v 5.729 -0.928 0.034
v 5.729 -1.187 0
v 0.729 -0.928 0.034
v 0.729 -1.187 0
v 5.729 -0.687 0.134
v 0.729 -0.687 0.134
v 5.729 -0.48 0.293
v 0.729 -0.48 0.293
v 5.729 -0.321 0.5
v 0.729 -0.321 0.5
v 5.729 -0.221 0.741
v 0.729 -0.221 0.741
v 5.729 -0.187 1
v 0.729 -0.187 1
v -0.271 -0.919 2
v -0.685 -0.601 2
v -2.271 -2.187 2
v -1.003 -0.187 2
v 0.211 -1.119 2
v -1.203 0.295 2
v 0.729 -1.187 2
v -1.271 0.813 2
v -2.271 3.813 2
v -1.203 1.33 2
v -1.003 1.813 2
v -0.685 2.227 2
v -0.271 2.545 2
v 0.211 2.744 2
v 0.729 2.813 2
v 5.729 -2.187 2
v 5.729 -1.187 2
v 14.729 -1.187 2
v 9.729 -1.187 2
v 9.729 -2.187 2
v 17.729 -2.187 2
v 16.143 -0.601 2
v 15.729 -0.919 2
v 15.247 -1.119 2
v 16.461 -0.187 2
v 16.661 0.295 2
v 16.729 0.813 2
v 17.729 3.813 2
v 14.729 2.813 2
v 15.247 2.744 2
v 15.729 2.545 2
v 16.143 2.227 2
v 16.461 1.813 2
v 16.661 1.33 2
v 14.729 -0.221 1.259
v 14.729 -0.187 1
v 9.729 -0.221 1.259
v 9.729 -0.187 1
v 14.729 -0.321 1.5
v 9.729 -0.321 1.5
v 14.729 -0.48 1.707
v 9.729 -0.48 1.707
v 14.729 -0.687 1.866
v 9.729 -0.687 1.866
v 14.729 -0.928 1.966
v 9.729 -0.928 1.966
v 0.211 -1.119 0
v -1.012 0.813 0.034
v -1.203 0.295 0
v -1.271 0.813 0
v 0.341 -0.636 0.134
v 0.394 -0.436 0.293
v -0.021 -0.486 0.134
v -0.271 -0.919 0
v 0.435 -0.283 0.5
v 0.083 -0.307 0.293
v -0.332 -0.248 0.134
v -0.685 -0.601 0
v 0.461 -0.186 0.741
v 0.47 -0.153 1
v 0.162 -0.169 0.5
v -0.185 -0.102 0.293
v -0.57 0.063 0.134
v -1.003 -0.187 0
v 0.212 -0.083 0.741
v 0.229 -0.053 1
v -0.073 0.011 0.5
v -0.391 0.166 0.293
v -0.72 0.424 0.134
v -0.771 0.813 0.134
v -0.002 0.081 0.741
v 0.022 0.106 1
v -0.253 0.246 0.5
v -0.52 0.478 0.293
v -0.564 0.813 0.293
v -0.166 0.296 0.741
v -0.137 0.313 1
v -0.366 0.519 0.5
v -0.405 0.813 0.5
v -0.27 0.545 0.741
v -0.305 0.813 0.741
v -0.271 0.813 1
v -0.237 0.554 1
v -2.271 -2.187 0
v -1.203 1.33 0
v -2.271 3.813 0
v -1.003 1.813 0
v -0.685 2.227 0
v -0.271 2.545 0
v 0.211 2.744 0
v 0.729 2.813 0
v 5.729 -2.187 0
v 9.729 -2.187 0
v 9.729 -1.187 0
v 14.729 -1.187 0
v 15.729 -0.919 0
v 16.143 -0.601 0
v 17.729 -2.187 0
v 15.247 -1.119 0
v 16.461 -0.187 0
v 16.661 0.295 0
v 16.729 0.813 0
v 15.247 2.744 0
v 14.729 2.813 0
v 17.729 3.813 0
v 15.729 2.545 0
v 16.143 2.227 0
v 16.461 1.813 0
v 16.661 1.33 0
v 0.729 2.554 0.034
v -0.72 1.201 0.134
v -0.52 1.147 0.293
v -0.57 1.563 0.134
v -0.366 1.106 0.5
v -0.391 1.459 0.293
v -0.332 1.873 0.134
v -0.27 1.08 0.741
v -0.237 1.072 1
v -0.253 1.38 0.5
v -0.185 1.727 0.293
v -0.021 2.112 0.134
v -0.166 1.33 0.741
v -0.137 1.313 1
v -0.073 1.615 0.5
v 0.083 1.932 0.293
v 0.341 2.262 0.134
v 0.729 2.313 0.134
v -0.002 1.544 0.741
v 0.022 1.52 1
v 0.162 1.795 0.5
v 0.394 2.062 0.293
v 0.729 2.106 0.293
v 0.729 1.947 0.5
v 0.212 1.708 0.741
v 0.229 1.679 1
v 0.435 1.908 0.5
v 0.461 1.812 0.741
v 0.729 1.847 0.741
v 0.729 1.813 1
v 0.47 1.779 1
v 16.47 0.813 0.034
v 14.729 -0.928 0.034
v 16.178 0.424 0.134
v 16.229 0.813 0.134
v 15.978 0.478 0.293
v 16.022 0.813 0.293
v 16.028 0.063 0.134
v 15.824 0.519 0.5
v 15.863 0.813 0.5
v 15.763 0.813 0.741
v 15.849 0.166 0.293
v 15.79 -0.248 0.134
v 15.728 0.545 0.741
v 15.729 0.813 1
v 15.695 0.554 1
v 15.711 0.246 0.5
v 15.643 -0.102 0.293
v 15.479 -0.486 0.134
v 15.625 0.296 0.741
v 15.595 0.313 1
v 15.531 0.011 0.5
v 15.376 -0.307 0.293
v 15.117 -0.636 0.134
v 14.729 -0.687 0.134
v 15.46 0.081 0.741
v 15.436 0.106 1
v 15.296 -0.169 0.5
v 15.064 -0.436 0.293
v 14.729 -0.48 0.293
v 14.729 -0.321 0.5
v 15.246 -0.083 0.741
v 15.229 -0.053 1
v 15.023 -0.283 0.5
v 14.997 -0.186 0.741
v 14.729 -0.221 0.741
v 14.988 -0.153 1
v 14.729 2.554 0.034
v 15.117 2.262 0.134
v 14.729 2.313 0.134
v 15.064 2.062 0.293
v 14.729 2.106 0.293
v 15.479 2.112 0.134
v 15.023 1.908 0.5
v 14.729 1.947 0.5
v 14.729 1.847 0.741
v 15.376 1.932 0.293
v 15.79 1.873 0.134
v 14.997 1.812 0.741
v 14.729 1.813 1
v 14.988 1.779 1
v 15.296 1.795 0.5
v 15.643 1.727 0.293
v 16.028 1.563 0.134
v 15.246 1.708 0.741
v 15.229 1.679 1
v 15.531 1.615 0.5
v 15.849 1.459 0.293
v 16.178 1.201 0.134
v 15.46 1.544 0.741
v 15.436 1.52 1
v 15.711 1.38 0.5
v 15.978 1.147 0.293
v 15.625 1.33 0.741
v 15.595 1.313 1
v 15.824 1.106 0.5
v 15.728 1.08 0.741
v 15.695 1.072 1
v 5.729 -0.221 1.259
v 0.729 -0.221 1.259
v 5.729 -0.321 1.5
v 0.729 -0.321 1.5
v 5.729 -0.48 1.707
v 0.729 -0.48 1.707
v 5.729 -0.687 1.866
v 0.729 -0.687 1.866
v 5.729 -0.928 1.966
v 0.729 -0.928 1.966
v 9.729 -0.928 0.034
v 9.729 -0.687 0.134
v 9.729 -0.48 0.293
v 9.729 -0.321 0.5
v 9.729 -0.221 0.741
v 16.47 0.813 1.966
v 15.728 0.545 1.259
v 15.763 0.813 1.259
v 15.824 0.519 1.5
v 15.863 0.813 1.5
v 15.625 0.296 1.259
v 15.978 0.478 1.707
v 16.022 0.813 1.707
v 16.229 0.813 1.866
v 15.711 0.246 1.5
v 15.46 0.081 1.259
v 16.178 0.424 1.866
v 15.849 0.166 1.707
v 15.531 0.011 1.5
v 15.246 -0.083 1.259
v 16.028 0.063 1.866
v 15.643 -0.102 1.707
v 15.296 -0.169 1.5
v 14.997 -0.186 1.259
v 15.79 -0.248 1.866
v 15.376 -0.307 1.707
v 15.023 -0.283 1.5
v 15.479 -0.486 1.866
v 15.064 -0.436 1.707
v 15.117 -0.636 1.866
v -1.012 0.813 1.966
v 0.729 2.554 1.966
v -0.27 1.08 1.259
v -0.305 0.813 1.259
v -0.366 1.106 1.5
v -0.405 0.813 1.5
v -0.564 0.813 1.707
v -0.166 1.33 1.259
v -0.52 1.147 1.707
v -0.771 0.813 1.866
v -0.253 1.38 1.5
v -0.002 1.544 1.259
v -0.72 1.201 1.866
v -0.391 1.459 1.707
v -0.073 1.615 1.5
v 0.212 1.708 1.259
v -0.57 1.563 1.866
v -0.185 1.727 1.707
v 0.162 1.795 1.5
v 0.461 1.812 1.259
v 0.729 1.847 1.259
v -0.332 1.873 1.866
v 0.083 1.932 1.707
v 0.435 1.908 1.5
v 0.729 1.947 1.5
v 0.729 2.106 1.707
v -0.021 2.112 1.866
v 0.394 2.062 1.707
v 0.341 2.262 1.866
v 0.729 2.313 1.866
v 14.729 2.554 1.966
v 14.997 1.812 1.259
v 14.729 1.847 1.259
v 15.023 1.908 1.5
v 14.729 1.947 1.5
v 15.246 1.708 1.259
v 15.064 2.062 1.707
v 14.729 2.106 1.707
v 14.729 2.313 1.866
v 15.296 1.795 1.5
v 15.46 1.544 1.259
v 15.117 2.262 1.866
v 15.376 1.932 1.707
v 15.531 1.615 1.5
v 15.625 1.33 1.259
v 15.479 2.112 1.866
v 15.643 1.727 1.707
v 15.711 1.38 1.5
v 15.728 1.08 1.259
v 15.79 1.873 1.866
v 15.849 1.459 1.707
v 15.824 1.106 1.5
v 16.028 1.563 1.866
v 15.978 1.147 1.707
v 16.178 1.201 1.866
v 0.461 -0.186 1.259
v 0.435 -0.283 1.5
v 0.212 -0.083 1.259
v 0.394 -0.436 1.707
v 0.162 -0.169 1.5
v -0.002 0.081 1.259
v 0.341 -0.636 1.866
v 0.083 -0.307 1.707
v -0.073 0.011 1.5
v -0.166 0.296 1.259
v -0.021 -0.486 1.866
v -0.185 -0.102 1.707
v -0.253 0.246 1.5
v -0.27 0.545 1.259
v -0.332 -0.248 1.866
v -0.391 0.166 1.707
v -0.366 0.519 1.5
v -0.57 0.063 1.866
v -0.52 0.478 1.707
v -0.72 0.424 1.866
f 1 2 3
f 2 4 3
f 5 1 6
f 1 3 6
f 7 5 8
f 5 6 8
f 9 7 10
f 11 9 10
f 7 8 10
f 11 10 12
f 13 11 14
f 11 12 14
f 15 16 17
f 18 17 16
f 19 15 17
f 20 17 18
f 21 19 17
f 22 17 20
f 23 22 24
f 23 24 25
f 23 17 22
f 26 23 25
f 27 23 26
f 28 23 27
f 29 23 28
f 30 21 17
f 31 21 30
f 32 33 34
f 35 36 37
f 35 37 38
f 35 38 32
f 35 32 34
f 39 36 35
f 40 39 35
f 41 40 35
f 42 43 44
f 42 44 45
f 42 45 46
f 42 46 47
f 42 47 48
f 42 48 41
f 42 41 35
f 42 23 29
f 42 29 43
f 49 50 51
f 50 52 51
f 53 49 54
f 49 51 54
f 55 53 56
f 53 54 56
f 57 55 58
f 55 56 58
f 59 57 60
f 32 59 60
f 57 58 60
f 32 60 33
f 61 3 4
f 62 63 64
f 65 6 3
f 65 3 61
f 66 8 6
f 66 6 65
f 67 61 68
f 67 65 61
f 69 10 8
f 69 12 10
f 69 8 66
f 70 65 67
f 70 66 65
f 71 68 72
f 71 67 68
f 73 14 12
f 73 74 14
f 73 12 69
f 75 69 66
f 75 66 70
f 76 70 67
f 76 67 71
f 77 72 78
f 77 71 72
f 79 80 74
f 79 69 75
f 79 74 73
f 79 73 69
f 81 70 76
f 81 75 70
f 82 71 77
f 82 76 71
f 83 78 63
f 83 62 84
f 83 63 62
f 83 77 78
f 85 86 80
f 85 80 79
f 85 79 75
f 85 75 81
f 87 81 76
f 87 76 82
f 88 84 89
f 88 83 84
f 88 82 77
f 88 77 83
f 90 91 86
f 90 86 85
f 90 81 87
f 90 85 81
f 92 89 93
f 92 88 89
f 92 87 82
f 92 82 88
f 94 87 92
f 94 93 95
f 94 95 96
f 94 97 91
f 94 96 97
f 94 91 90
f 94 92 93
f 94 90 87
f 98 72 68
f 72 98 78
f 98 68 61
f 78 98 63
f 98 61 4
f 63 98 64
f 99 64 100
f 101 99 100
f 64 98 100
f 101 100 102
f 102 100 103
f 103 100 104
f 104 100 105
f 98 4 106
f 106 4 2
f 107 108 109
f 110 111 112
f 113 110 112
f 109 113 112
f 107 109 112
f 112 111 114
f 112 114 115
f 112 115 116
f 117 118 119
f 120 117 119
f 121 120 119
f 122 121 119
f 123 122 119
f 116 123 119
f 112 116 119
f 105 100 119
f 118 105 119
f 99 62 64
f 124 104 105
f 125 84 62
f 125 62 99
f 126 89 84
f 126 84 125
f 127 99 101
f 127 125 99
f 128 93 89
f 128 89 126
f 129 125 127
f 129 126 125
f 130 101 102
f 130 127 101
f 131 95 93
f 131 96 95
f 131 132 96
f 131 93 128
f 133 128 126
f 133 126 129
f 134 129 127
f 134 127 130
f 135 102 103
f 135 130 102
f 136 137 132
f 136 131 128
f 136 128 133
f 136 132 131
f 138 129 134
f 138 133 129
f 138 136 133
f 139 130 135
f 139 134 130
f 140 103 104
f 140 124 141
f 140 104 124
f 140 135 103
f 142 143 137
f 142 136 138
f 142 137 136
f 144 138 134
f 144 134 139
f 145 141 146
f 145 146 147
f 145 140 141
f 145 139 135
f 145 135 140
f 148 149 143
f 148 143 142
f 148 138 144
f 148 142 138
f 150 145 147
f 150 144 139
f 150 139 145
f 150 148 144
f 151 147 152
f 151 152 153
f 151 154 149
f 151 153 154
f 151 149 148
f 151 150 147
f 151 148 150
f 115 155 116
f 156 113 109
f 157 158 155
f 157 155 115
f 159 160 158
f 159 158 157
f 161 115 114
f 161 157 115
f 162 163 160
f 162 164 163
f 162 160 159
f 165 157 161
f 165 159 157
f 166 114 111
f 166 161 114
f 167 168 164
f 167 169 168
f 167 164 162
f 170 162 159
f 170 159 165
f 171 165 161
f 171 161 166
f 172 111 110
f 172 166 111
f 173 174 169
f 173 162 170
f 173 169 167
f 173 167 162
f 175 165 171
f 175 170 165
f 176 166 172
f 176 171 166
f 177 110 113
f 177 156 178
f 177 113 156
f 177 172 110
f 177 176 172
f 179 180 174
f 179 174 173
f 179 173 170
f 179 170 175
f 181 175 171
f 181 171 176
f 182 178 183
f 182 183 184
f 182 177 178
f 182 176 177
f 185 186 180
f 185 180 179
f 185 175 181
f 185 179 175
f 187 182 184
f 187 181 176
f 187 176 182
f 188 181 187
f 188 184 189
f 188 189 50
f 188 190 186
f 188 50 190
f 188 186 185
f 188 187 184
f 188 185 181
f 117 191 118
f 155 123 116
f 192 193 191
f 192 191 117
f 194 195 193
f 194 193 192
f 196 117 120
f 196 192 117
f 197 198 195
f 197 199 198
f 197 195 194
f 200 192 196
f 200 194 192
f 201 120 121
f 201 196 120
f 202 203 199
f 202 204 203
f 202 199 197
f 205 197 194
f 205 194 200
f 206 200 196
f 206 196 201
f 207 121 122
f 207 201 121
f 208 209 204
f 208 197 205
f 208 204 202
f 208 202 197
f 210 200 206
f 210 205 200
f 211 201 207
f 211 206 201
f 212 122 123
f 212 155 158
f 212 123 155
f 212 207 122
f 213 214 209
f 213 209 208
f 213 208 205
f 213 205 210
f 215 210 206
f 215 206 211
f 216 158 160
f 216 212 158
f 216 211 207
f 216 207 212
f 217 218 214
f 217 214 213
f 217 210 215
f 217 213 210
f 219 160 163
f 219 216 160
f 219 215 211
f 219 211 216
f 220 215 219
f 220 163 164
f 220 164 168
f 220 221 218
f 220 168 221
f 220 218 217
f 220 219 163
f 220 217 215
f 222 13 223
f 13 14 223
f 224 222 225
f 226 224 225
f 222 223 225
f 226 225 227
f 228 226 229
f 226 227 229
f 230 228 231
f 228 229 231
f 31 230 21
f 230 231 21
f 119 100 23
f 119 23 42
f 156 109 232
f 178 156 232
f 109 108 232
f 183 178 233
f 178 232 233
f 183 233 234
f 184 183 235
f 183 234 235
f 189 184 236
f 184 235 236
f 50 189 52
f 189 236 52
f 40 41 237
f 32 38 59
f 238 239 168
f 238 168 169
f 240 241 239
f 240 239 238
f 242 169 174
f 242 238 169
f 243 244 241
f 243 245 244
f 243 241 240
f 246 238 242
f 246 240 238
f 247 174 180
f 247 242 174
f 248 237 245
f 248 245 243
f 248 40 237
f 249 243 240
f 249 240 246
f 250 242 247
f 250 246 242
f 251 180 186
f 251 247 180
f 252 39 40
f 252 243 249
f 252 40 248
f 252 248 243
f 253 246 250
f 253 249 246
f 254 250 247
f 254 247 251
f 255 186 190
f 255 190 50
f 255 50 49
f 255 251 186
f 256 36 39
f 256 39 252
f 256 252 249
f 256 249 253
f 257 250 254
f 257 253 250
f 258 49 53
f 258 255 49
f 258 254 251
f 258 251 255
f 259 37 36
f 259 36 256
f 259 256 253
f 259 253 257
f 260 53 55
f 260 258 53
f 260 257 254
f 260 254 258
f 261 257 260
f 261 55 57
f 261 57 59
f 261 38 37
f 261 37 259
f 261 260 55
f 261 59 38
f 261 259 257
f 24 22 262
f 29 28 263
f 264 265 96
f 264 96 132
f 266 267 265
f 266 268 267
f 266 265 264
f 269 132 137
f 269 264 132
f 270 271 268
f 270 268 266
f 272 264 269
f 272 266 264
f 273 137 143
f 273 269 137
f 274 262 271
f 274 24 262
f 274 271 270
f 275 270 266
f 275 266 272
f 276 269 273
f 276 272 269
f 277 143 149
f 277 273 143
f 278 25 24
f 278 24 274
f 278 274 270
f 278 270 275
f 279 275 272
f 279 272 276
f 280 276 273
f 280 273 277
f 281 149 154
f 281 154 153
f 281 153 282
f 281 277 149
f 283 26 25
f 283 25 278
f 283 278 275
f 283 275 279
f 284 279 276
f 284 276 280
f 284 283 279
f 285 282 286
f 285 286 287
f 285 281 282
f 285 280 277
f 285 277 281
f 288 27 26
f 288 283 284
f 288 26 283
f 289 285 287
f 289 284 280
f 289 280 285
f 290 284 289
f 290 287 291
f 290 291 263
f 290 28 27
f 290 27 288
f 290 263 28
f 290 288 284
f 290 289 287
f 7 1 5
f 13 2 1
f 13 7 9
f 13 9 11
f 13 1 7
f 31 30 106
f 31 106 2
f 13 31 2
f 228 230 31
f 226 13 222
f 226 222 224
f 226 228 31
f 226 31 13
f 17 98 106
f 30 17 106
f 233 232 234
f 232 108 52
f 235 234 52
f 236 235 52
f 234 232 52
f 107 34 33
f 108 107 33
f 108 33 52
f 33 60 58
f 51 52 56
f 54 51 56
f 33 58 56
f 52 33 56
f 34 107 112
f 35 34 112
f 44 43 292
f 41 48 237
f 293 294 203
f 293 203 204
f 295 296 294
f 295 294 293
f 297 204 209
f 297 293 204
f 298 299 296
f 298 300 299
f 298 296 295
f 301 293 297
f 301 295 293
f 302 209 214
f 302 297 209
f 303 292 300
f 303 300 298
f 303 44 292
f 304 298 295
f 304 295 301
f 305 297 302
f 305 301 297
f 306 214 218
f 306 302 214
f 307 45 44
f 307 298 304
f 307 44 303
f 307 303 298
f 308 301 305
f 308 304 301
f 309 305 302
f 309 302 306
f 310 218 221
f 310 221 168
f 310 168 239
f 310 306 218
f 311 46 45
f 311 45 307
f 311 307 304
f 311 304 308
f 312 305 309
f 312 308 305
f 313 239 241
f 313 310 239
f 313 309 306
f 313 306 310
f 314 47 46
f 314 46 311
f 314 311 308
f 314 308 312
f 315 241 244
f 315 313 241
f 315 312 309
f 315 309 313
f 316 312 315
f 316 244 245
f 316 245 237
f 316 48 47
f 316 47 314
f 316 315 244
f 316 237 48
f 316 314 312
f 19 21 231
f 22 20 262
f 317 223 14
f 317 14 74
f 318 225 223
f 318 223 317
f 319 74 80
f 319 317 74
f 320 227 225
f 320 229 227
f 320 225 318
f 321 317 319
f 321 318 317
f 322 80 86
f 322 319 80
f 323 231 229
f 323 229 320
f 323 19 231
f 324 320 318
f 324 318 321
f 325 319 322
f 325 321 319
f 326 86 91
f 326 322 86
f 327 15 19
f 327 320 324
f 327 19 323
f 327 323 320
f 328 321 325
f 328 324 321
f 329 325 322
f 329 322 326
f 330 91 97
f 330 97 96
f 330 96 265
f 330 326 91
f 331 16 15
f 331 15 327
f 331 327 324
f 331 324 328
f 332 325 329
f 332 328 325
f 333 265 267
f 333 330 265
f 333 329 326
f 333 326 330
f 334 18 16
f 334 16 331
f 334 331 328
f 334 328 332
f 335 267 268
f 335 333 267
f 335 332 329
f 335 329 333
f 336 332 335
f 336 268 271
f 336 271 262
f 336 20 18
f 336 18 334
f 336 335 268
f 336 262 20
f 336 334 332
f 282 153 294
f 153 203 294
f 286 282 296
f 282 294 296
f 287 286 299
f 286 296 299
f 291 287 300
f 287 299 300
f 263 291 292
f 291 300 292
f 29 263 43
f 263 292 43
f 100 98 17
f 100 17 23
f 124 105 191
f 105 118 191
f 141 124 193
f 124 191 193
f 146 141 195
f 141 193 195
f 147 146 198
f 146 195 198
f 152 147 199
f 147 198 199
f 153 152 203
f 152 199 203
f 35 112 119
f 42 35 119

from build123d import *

# Parameters (mm, degrees)
F0_W     = 20
F0_H     = 6
F1_DEPTH = 2
F2_T     = -2
F3_W     = 4
F3_H     = 2
F4_DEPTH = 25
F5_F1_R  = 0.9999
F5_F2_R  = 0.9999


# Not quite as in the source:
# - a fillet or chamfer is up to 0.001 mm smaller than in the source, because OpenCascade refuses the exact size


with BuildPart() as f1:
    # F0 (on Top) → F1 (new body)
    with BuildSketch(Plane.XY):
        with Locations((7.7290598062, 0.812693499)):
            Rectangle(F0_W, F0_H)
    extrude(amount=F1_DEPTH)

    # F2
    f2_openings = [f1.faces().sort_by_distance(p)[0] for p in [
        (7.72906, 0.812693, 2),
        (7.72906, 0.812693, 0),
    ]]
    offset(amount=F2_T, openings=f2_openings)

    # F3 (on face) → F4 (cut)
    with BuildSketch(Plane.XY.offset(2)):
        with Locations((7.7290598062, -1.187306501)):
            Rectangle(F3_W, F3_H)
    extrude(amount=-F4_DEPTH, mode=Mode.SUBTRACT)

    # F5: fillet of radius 1 on 8 edges, made by hand

    # F5_f1 (radius 1 in the source; OpenCascade refuses exactly that, so slightly less here)
    f5_f1_edges = [f1.edges().sort_by_distance(p)[0] for p in [
        (-0.2709401938, 1.812693499, 1),
        (-0.2709401938, -0.187306501, 1),
        (15.7290598062, -0.187306501, 1),
        (15.7290598062, 1.812693499, 1),
    ]]
    fillet(f5_f1_edges, radius=F5_F1_R)

    # F5_f2 (radius 1 in the source; OpenCascade refuses exactly that, so slightly less here)
    f5_f2_edges = [f1.edges().sort_by_distance(p)[0] for p in [
        (-0.2709401938, 0.812693499, 0),
        (-0.2709401938, 0.812693499, 2),
        (15.7290598062, 0.812693499, 0),
        (15.7290598062, 0.812693499, 2),
        (15.4361958767, 0.1055574285, 2),
        (15.4361958767, 1.5198295695, 2),
        (15.4361958767, 0.1055574285, 0),
        (15.4361958767, 1.5198295695, 0),
        (0.0219237357, 1.5198295695, 2),
        (0.0219237357, 0.1055574285, 2),
        (0.0219237357, 1.5198295695, 0),
        (0.0219237357, 0.1055574285, 0),
    ]]
    fillet(f5_f2_edges, radius=F5_F2_R)


solid = f1.part
